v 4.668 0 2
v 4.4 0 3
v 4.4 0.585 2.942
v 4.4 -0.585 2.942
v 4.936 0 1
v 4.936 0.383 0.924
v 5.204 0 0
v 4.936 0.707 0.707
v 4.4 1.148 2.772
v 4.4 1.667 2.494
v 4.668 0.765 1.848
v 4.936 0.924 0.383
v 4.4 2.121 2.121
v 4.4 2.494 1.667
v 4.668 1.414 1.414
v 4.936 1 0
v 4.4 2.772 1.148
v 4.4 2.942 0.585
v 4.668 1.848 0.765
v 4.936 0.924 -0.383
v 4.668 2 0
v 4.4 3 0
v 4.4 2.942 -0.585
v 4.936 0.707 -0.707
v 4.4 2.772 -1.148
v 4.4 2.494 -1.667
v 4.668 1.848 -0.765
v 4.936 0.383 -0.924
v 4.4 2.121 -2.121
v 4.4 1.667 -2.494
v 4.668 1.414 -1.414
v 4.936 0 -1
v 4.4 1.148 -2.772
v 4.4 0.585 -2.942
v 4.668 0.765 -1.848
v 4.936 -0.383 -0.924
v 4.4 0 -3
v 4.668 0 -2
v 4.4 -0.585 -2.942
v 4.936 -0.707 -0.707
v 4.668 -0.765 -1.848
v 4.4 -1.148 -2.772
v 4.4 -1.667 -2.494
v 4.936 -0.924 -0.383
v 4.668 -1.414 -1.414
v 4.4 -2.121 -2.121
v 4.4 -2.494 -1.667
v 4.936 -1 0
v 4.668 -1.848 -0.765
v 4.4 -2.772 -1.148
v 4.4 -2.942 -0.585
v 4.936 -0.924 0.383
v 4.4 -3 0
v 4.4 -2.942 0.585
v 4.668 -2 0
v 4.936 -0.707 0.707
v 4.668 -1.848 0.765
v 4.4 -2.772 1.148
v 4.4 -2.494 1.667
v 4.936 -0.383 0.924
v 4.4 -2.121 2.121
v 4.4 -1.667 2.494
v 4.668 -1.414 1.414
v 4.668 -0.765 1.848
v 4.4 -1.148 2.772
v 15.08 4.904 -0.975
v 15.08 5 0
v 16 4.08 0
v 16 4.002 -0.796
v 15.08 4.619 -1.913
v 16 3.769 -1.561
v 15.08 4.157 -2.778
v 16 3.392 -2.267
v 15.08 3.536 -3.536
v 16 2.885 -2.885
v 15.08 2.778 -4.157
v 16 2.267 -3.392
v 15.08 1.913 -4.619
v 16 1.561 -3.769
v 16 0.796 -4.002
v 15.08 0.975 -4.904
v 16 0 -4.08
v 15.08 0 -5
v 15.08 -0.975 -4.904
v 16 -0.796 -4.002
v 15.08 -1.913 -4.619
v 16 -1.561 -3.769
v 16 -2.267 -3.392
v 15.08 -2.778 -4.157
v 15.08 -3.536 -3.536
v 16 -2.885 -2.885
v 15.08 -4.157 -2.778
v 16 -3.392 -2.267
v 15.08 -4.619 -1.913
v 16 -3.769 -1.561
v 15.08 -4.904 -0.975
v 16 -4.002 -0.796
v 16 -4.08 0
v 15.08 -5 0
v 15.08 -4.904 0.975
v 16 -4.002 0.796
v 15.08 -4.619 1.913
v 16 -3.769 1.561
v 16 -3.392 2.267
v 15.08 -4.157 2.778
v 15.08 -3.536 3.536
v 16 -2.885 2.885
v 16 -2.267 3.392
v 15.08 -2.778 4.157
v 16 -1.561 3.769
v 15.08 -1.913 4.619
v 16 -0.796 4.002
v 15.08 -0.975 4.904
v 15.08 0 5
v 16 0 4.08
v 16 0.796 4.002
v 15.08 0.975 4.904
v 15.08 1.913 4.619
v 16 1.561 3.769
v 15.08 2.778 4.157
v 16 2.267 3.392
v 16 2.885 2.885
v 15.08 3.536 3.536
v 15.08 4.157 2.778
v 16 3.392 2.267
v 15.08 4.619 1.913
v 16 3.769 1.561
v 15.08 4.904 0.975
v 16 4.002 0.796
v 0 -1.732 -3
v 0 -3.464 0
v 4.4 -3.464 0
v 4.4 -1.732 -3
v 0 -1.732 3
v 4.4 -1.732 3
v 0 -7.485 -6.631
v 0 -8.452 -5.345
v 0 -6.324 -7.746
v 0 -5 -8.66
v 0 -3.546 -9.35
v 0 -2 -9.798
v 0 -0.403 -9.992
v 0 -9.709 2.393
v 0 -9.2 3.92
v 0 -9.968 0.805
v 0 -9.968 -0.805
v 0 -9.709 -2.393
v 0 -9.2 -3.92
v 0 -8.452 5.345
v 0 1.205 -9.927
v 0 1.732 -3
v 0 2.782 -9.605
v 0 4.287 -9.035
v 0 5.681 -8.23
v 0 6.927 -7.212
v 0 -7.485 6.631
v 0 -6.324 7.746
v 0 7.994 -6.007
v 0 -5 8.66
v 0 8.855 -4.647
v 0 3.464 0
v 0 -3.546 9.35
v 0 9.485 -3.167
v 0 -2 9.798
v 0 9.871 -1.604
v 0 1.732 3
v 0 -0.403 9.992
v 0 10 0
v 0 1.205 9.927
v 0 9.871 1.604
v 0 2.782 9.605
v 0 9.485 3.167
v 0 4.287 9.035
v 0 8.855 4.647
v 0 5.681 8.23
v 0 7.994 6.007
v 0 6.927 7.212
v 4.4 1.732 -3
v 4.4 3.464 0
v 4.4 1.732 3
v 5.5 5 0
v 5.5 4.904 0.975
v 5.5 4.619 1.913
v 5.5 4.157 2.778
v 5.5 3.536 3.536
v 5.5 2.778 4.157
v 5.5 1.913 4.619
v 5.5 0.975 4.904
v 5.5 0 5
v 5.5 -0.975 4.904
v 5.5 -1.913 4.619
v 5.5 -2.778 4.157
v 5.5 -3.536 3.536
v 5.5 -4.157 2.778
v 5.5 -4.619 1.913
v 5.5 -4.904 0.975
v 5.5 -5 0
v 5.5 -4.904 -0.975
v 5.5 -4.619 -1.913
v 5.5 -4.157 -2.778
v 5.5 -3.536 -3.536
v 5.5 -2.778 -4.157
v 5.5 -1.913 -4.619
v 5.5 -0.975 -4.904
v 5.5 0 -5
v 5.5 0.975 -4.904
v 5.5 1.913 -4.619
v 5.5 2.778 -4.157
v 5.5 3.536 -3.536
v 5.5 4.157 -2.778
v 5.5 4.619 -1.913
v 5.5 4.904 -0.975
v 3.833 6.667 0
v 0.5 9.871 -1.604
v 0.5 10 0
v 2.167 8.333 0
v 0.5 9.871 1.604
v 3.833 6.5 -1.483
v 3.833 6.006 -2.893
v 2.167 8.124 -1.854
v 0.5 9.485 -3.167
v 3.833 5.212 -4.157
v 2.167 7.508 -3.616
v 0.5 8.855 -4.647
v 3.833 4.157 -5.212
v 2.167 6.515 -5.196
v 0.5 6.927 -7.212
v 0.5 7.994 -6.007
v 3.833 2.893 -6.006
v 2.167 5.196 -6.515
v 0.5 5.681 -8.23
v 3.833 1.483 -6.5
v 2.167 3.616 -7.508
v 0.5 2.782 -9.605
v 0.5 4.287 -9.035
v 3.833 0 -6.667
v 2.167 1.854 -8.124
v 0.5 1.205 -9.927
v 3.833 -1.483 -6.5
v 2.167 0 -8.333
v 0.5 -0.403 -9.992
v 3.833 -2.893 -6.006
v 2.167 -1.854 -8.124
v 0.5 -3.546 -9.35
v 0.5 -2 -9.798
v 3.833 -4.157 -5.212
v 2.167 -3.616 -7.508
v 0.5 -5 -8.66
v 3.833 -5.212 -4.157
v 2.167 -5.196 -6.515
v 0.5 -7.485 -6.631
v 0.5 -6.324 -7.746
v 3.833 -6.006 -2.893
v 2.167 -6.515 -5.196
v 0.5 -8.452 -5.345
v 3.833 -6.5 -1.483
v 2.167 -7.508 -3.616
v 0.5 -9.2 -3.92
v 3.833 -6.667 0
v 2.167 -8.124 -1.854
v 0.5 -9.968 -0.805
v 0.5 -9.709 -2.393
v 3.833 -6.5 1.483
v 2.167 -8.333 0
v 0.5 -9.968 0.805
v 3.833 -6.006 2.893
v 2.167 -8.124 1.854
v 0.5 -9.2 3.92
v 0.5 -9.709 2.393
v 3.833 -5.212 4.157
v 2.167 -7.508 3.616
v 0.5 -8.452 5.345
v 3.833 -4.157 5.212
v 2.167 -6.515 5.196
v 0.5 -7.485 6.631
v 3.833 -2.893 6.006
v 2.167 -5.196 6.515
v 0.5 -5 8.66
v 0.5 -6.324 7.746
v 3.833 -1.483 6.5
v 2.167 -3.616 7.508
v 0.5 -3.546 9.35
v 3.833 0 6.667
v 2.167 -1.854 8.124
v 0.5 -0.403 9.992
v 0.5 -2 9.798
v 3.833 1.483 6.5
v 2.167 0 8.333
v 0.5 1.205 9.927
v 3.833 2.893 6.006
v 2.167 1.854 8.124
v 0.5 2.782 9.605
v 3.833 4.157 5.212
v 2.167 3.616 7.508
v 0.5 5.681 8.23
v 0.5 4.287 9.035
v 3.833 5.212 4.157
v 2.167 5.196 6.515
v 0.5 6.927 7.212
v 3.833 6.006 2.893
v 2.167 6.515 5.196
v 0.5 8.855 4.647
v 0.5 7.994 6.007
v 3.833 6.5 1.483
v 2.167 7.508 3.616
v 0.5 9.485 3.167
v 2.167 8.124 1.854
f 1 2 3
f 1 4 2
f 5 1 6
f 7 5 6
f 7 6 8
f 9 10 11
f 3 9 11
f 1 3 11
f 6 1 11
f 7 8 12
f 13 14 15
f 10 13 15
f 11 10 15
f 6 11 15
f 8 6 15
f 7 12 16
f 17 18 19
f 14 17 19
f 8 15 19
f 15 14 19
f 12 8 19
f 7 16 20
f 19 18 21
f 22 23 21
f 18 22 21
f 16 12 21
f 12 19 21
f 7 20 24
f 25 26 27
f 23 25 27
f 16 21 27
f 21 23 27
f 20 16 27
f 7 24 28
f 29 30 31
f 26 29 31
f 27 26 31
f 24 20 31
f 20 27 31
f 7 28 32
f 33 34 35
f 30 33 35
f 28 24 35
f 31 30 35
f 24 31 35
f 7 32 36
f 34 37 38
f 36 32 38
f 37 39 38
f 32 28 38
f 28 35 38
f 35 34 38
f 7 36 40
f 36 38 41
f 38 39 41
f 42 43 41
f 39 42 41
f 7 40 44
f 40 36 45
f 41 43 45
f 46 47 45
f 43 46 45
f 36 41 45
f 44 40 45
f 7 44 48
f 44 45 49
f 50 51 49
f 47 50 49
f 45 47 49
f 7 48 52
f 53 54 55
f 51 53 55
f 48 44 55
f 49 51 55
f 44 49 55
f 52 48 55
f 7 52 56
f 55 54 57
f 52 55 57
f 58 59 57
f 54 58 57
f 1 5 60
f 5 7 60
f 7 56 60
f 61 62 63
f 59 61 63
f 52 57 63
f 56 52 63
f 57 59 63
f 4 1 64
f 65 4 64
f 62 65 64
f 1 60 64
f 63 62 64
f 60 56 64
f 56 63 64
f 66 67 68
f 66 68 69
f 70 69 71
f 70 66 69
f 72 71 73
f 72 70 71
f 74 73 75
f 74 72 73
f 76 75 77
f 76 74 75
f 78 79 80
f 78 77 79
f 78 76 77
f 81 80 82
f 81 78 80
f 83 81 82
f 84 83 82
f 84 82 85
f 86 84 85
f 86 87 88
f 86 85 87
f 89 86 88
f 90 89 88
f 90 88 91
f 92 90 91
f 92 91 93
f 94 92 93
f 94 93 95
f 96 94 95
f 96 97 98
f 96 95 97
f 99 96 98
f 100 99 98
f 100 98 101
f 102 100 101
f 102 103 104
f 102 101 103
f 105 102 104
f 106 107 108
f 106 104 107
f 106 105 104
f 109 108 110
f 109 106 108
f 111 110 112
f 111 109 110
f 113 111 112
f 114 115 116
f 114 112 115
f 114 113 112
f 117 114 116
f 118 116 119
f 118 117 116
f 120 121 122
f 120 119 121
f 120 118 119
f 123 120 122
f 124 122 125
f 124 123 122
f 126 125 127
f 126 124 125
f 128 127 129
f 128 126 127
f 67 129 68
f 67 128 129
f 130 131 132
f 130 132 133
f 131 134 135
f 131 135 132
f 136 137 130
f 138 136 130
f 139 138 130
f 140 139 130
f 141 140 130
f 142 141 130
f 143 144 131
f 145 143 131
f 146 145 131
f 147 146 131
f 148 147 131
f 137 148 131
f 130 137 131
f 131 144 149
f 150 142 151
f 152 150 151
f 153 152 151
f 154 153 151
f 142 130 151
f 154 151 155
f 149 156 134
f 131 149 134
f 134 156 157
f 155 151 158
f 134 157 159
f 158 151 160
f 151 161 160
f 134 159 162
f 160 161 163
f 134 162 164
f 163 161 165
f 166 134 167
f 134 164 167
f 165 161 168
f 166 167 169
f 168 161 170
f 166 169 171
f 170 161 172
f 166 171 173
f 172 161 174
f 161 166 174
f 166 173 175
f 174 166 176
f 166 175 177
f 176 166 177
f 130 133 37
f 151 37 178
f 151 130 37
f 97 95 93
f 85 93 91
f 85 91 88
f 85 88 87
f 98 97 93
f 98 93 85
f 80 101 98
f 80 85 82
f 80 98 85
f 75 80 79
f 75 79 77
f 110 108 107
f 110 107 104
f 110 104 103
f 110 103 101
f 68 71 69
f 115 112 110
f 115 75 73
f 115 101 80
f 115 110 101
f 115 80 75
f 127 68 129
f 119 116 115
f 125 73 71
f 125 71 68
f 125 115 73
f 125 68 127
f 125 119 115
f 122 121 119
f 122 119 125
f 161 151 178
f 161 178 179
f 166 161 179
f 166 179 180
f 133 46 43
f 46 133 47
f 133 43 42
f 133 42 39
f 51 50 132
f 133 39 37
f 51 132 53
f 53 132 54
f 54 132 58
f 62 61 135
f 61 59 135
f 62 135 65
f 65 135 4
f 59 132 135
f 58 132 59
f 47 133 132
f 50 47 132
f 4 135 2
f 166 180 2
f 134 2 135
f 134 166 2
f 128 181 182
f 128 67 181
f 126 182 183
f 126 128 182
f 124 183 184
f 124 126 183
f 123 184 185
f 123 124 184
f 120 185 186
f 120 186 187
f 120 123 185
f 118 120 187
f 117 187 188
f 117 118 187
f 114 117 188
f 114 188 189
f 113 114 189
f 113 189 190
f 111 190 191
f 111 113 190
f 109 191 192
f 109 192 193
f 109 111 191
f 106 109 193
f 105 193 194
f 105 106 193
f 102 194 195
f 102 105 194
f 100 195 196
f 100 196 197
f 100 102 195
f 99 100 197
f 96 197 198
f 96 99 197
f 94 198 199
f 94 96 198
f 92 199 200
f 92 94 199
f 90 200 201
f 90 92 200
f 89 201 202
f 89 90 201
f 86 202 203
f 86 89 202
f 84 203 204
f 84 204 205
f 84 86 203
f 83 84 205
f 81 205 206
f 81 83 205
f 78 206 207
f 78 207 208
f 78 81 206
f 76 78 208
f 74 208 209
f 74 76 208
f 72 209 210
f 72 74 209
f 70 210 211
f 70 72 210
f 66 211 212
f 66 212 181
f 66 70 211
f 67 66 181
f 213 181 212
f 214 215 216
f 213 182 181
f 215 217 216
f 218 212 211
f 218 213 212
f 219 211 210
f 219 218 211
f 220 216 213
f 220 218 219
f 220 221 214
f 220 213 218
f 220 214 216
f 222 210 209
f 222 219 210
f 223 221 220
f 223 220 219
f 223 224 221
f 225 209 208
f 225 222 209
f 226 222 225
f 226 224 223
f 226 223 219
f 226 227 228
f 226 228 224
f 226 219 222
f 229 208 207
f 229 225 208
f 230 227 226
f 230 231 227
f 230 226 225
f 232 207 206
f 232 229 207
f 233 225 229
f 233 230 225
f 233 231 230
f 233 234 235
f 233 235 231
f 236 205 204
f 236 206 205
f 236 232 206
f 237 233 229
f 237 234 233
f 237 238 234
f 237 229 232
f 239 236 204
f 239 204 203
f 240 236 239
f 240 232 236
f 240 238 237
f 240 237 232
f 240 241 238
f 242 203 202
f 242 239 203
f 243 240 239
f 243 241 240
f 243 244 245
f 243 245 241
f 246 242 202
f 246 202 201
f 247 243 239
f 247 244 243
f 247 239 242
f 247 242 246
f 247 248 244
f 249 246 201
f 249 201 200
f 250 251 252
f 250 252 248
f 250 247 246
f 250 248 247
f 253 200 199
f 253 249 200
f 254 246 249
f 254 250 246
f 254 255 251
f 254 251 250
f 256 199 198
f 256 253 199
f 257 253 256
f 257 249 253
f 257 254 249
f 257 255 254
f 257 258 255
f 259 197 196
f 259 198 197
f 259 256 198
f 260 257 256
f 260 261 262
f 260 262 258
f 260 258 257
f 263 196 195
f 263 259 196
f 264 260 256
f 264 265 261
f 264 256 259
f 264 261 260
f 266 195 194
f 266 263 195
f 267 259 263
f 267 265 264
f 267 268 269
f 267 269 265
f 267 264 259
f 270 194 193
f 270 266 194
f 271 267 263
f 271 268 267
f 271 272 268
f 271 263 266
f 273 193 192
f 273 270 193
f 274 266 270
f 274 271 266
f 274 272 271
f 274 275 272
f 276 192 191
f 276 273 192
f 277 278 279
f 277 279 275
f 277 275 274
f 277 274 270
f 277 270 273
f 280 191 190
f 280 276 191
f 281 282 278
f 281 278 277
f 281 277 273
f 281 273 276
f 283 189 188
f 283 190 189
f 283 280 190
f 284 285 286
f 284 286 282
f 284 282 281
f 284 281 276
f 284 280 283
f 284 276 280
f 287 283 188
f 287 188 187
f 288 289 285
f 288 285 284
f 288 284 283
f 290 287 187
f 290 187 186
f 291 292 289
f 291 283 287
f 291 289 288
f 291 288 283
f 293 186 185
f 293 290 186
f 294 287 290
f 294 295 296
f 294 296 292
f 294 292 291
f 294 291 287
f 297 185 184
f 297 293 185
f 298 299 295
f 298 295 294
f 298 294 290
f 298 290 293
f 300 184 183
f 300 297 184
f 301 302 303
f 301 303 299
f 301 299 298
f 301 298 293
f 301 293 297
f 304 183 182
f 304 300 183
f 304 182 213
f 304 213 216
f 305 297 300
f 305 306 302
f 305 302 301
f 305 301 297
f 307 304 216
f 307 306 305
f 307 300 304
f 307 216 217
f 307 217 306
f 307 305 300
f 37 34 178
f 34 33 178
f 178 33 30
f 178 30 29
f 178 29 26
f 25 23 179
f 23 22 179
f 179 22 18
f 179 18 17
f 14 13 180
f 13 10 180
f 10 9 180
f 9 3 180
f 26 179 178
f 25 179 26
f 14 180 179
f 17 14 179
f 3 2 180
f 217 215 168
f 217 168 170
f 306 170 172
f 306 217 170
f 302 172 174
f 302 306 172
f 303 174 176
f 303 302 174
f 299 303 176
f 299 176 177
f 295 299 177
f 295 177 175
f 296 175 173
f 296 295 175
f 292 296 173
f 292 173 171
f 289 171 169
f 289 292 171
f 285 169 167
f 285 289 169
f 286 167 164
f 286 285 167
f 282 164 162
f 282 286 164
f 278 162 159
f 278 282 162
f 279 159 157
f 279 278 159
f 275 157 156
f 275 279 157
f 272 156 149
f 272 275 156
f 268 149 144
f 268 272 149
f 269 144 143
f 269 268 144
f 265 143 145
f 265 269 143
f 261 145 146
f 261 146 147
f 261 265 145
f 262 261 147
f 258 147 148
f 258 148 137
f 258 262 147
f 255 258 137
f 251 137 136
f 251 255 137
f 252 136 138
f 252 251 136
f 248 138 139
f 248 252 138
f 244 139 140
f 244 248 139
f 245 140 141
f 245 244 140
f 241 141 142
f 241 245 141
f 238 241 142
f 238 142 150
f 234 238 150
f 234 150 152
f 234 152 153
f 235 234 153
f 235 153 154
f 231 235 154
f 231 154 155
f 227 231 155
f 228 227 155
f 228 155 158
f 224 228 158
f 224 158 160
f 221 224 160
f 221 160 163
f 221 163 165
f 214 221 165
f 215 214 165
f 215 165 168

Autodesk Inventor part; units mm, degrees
sketch "Sketch_1" plane through (0, 0, 0) normal (0, 0, 1) x (1, 0, 0)
  line L0 (16, 0) -> (0, 0)
  line L1 (0, 0) -> (0, 10)
  line L2 (0, 10) -> (0.5, 10)
  line L3 (0.5, 10) -> (5.5, 5)
  line L4 (5.5, 5) -> (15.08, 5)
  line L5 (15.08, 5) -> (16, 4.08)
  line L6 (16, 4.08) -> (16, 0)
  line L7 (16, 0) -> (0, 0)
revolve "Revolution1" add sketch "Sketch_1" angle 360 about axis through (16, 0, 0) along (1, 0, 0)
thread "Thread1" size "M10x1.5" class "6g" standard "ISO Metric profile" full length
sketch "Sketch2" plane through (0, 0, 0) normal (-1, 0, 0) x (0, 0, 1)
  point P0 (0, 0)
hole "Hole1" at (0, 0, 0) direction (1, 0, 0) diameter 6 depth 4.4 tip angle 150
sketch "Sketch_3" plane through (0, 0, 0) normal (1, 0, 0) x (0, 1, 0)
  line L0 (-1.7321, 3) -> (-3.4641, 0)
  line L1 (-3.4641, 0) -> (-1.7321, -3)
  line L2 (-1.7321, -3) -> (1.7321, -3)
  line L3 (1.7321, -3) -> (3.4641, 0)
  line L4 (3.4641, 0) -> (1.7321, 3)
  line L5 (1.7321, 3) -> (-1.7321, 3)
extrude "Extrusion1" cut sketch "Sketch_3" along normal blind 4.4
ref_plane "screw_to_nut_XY" through (0, 0, 0) normal (1, 0, 0) x (0, 0, -1)
ref_plane "screw_to_nut_YZ" through (0, 0, 0) normal (0, 0, -1) x (0, 1, 0)
ref_plane "screw_to_nut_ZX" through (0, 0, 0) normal (0, 1, 0) x (1, 0, 0)
properties part number "FB10-16_"
